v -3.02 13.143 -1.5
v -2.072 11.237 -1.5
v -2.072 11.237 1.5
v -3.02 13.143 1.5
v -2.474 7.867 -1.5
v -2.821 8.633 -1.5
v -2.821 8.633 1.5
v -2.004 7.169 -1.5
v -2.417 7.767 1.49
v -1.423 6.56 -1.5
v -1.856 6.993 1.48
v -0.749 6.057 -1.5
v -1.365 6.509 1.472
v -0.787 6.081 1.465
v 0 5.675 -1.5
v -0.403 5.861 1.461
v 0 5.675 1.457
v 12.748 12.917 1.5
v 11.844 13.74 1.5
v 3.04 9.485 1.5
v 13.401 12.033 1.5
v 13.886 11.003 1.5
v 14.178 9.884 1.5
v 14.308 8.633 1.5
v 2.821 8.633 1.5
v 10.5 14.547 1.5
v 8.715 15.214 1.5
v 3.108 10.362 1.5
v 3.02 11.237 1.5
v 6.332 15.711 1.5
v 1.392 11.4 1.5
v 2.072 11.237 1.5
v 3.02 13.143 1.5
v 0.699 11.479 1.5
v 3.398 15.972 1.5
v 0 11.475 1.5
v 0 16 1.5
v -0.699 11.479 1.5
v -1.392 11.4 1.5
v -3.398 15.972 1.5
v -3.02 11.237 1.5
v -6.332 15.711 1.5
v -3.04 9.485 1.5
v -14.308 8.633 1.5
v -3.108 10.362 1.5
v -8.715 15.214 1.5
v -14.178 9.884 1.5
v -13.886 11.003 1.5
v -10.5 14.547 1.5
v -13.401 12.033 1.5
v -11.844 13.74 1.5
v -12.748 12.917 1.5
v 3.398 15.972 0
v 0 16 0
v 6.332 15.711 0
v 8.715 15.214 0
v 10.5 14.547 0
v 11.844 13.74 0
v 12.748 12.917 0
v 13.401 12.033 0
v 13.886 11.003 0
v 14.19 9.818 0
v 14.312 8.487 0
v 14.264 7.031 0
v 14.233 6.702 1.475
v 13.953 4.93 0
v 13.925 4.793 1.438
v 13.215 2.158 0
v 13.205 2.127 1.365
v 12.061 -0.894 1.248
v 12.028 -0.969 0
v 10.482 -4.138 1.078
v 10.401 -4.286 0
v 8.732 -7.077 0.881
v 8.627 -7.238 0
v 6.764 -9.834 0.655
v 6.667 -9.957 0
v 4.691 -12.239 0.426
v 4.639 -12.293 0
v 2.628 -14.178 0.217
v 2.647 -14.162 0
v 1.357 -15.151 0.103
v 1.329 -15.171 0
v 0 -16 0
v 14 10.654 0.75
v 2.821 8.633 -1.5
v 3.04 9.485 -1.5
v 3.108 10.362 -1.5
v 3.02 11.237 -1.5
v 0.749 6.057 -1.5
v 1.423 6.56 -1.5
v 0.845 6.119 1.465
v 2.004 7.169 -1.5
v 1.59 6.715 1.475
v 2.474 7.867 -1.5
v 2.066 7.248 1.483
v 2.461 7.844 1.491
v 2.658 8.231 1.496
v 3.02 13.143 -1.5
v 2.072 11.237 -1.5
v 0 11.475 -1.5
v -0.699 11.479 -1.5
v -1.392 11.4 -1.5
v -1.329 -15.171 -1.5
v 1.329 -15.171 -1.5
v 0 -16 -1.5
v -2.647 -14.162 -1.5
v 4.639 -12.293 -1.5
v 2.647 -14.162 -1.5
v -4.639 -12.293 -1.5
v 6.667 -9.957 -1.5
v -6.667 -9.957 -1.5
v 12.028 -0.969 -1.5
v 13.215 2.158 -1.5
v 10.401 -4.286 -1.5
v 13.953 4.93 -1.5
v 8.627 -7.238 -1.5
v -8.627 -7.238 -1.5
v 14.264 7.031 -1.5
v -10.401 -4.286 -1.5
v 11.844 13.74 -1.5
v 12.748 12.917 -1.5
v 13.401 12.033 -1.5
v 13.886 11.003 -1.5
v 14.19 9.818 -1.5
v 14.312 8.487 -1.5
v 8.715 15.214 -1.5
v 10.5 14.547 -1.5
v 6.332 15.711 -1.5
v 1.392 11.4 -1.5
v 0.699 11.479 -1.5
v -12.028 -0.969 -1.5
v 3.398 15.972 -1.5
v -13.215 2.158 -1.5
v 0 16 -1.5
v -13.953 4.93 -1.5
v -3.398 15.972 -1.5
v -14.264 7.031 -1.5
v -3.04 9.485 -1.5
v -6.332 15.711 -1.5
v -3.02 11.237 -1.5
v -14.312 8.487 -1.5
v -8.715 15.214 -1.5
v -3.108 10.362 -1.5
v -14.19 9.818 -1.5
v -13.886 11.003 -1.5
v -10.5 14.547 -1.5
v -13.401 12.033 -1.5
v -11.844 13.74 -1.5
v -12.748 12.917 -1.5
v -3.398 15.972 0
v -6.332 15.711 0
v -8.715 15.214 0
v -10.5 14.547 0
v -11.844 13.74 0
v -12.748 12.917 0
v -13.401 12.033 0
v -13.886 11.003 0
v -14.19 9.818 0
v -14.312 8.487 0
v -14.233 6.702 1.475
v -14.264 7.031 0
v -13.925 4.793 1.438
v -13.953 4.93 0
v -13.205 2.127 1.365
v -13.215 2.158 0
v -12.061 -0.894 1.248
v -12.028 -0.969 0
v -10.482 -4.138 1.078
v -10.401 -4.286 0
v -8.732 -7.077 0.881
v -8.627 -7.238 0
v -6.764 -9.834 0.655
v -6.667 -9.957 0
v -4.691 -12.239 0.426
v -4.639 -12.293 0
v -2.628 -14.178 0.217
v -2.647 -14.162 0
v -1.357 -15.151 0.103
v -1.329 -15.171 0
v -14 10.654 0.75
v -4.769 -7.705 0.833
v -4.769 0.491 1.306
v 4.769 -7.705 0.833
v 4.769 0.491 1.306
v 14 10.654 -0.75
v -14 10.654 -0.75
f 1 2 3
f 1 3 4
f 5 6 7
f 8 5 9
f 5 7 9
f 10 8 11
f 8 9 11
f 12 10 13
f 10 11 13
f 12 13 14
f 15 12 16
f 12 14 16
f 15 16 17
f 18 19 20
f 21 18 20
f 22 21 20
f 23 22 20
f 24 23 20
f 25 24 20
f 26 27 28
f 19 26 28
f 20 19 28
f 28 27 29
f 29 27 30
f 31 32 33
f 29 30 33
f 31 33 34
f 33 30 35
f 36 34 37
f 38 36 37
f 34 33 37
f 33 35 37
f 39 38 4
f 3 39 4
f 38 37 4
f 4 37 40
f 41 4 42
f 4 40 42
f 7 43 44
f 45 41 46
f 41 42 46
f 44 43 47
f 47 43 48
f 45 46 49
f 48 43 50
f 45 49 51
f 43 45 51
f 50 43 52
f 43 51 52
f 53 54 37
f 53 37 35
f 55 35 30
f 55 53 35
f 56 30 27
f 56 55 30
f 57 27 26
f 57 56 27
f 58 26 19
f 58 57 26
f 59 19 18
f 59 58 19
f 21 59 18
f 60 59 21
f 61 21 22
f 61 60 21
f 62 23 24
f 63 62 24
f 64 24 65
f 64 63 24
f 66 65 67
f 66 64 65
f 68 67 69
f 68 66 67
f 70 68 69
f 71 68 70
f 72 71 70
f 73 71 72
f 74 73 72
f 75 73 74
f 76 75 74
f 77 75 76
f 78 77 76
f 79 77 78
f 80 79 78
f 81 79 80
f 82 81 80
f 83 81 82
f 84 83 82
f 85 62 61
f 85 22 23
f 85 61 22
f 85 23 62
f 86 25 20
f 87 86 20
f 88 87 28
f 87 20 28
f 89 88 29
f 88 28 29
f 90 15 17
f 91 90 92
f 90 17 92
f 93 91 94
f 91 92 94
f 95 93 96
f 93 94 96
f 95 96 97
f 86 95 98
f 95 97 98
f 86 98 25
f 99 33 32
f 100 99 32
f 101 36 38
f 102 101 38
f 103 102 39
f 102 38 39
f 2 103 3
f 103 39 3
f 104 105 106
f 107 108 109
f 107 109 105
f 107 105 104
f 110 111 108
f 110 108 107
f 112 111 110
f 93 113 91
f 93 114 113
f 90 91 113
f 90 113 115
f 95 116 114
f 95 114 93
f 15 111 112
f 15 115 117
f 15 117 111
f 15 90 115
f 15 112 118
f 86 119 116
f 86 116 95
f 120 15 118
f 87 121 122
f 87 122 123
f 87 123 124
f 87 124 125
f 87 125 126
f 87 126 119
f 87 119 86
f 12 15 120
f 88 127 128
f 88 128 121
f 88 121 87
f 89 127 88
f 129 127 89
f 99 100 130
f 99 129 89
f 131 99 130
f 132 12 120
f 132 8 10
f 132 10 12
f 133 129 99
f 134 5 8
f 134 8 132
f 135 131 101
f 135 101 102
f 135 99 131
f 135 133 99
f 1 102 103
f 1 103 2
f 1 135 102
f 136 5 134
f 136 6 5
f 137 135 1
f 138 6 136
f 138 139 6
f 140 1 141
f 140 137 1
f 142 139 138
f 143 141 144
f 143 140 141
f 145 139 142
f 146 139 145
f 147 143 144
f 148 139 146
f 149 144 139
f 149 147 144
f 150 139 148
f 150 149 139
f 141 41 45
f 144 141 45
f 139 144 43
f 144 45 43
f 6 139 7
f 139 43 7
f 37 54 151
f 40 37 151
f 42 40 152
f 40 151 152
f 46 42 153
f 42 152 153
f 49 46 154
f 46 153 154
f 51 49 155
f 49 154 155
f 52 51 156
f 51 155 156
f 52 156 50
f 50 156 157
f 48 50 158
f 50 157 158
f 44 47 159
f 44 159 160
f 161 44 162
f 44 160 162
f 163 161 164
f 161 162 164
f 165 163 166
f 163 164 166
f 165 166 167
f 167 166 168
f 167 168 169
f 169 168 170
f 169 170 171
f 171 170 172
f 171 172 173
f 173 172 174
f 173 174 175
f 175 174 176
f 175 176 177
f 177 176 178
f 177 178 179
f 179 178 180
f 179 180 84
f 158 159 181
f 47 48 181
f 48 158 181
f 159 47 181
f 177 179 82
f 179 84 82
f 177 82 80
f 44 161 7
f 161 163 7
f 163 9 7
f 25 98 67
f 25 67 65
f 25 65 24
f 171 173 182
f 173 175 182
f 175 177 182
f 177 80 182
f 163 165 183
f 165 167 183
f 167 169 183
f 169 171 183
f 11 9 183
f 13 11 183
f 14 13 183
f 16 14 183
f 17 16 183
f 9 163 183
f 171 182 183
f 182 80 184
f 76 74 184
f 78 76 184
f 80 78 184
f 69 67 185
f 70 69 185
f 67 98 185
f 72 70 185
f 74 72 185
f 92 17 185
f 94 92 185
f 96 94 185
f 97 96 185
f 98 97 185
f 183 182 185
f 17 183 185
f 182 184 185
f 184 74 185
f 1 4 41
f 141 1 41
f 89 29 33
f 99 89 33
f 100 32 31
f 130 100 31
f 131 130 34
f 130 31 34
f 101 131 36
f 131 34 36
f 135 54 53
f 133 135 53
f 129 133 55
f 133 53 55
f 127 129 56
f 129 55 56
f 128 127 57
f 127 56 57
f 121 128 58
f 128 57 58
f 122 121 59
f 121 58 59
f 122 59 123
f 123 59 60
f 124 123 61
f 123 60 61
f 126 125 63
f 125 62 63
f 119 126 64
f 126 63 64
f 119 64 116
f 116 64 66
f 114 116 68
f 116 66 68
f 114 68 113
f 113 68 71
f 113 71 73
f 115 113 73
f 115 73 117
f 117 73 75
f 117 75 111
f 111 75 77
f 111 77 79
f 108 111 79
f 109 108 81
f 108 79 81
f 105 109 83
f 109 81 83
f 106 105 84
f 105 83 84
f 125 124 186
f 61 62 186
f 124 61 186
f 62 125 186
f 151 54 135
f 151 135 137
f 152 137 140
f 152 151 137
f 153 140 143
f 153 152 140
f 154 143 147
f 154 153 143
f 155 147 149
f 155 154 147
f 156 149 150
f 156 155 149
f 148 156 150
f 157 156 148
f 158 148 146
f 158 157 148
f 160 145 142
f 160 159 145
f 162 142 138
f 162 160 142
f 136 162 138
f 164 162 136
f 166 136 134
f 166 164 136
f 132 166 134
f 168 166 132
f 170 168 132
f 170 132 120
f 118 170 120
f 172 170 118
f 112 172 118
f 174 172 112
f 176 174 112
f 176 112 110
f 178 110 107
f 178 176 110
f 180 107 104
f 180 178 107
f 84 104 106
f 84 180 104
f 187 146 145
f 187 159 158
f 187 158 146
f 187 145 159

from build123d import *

# Parameters (mm, degrees)
F1_DEPTH = 1.5
F4_DEPTH = 35
F6_DEPTH = 25


with BuildPart() as f1:
    # F0 (on Top) → F1 (new body, symmetric)
    with BuildSketch(Plane.XY):
        with BuildLine():
            add(Edge.make_bspline(
                [(0, 16), (6.1912308447, 16.1269828677), (21.6322143415, 14.6137327369), (8.0521190539, -11.5674184635), (0, -16)],
                knots=[0, 0, 0, 0, 0.4136694367, 1, 1, 1, 1], degree=3))
            add(Edge.make_bspline(
                [(0, 16), (-6.1912308447, 16.1269828677), (-21.6322143415, 14.6137327369), (-8.0521190539, -11.5674184635), (0, -16)],
                knots=[0, 0, 0, 0, 0.4136694367, 1, 1, 1, 1], degree=3))
        make_face()
    extrude(amount=F1_DEPTH, both=True)

    # F3 (on offset) → F4 (cut)
    with BuildSketch(Plane.YZ.offset(15)):
        with BuildLine():
            add(Edge.make_bspline(
                [(-16, 0), (-7.6402679005, 1.0387831861), (0.5034198032, 1.4199266316), (8.633417238, 1.5)],
                knots=[0, 0, 0, 0, 24.6053512698, 24.6053512698, 24.6053512698, 24.6053512698], degree=3))
            Line((8.633417238, 1.5), (-16, 1.5))
            Line((-16, 1.5), (-16, 0))
        make_face()
    extrude(amount=-F4_DEPTH, mode=Mode.SUBTRACT)

    # F5 (on face) → F6 (cut)
    with BuildSketch(Plane.XY.offset(1.5)):
        with BuildLine():
            ThreePointArc((2.0718916785, 11.2373186275), (1.0466922086, 11.4498374057), (0, 11.4750089124))
            ThreePointArc((0, 11.4750089124), (-1.0466922086, 11.4498374057), (-2.0718916785, 11.2373186275))
            Line((-2.0718916785, 11.2373186275), (-3.0199242756, 13.1428707391))
            Line((-3.0199242756, 13.1428707391), (-3.0199242756, 11.2373186275))
            ThreePointArc((-3.0199242756, 11.2373186275), (-3.0933443524, 9.9221413952), (-2.8208159928, 8.633417238))
            Line((-2.8208159928, 8.633417238), (2.8208159928, 8.633417238))
            ThreePointArc((2.8208159928, 8.633417238), (3.0933443524, 9.9221413952), (3.0199242756, 11.2373186275))
            Line((3.0199242756, 11.2373186275), (3.0199242756, 13.1428707391))
            Line((3.0199242756, 13.1428707391), (2.0718916785, 11.2373186275))
        make_face()
        with BuildLine():
            Line((2.8208159928, 8.633417238), (-2.8208159928, 8.633417238))
            ThreePointArc((-2.8208159928, 8.633417238), (-1.7265393737, 6.8526567573), (0, 5.6746877424))
            ThreePointArc((0, 5.6746877424), (1.7265393737, 6.8526567573), (2.8208159928, 8.633417238))
        make_face()
    extrude(amount=-F6_DEPTH, mode=Mode.SUBTRACT)


solid = f1.part
